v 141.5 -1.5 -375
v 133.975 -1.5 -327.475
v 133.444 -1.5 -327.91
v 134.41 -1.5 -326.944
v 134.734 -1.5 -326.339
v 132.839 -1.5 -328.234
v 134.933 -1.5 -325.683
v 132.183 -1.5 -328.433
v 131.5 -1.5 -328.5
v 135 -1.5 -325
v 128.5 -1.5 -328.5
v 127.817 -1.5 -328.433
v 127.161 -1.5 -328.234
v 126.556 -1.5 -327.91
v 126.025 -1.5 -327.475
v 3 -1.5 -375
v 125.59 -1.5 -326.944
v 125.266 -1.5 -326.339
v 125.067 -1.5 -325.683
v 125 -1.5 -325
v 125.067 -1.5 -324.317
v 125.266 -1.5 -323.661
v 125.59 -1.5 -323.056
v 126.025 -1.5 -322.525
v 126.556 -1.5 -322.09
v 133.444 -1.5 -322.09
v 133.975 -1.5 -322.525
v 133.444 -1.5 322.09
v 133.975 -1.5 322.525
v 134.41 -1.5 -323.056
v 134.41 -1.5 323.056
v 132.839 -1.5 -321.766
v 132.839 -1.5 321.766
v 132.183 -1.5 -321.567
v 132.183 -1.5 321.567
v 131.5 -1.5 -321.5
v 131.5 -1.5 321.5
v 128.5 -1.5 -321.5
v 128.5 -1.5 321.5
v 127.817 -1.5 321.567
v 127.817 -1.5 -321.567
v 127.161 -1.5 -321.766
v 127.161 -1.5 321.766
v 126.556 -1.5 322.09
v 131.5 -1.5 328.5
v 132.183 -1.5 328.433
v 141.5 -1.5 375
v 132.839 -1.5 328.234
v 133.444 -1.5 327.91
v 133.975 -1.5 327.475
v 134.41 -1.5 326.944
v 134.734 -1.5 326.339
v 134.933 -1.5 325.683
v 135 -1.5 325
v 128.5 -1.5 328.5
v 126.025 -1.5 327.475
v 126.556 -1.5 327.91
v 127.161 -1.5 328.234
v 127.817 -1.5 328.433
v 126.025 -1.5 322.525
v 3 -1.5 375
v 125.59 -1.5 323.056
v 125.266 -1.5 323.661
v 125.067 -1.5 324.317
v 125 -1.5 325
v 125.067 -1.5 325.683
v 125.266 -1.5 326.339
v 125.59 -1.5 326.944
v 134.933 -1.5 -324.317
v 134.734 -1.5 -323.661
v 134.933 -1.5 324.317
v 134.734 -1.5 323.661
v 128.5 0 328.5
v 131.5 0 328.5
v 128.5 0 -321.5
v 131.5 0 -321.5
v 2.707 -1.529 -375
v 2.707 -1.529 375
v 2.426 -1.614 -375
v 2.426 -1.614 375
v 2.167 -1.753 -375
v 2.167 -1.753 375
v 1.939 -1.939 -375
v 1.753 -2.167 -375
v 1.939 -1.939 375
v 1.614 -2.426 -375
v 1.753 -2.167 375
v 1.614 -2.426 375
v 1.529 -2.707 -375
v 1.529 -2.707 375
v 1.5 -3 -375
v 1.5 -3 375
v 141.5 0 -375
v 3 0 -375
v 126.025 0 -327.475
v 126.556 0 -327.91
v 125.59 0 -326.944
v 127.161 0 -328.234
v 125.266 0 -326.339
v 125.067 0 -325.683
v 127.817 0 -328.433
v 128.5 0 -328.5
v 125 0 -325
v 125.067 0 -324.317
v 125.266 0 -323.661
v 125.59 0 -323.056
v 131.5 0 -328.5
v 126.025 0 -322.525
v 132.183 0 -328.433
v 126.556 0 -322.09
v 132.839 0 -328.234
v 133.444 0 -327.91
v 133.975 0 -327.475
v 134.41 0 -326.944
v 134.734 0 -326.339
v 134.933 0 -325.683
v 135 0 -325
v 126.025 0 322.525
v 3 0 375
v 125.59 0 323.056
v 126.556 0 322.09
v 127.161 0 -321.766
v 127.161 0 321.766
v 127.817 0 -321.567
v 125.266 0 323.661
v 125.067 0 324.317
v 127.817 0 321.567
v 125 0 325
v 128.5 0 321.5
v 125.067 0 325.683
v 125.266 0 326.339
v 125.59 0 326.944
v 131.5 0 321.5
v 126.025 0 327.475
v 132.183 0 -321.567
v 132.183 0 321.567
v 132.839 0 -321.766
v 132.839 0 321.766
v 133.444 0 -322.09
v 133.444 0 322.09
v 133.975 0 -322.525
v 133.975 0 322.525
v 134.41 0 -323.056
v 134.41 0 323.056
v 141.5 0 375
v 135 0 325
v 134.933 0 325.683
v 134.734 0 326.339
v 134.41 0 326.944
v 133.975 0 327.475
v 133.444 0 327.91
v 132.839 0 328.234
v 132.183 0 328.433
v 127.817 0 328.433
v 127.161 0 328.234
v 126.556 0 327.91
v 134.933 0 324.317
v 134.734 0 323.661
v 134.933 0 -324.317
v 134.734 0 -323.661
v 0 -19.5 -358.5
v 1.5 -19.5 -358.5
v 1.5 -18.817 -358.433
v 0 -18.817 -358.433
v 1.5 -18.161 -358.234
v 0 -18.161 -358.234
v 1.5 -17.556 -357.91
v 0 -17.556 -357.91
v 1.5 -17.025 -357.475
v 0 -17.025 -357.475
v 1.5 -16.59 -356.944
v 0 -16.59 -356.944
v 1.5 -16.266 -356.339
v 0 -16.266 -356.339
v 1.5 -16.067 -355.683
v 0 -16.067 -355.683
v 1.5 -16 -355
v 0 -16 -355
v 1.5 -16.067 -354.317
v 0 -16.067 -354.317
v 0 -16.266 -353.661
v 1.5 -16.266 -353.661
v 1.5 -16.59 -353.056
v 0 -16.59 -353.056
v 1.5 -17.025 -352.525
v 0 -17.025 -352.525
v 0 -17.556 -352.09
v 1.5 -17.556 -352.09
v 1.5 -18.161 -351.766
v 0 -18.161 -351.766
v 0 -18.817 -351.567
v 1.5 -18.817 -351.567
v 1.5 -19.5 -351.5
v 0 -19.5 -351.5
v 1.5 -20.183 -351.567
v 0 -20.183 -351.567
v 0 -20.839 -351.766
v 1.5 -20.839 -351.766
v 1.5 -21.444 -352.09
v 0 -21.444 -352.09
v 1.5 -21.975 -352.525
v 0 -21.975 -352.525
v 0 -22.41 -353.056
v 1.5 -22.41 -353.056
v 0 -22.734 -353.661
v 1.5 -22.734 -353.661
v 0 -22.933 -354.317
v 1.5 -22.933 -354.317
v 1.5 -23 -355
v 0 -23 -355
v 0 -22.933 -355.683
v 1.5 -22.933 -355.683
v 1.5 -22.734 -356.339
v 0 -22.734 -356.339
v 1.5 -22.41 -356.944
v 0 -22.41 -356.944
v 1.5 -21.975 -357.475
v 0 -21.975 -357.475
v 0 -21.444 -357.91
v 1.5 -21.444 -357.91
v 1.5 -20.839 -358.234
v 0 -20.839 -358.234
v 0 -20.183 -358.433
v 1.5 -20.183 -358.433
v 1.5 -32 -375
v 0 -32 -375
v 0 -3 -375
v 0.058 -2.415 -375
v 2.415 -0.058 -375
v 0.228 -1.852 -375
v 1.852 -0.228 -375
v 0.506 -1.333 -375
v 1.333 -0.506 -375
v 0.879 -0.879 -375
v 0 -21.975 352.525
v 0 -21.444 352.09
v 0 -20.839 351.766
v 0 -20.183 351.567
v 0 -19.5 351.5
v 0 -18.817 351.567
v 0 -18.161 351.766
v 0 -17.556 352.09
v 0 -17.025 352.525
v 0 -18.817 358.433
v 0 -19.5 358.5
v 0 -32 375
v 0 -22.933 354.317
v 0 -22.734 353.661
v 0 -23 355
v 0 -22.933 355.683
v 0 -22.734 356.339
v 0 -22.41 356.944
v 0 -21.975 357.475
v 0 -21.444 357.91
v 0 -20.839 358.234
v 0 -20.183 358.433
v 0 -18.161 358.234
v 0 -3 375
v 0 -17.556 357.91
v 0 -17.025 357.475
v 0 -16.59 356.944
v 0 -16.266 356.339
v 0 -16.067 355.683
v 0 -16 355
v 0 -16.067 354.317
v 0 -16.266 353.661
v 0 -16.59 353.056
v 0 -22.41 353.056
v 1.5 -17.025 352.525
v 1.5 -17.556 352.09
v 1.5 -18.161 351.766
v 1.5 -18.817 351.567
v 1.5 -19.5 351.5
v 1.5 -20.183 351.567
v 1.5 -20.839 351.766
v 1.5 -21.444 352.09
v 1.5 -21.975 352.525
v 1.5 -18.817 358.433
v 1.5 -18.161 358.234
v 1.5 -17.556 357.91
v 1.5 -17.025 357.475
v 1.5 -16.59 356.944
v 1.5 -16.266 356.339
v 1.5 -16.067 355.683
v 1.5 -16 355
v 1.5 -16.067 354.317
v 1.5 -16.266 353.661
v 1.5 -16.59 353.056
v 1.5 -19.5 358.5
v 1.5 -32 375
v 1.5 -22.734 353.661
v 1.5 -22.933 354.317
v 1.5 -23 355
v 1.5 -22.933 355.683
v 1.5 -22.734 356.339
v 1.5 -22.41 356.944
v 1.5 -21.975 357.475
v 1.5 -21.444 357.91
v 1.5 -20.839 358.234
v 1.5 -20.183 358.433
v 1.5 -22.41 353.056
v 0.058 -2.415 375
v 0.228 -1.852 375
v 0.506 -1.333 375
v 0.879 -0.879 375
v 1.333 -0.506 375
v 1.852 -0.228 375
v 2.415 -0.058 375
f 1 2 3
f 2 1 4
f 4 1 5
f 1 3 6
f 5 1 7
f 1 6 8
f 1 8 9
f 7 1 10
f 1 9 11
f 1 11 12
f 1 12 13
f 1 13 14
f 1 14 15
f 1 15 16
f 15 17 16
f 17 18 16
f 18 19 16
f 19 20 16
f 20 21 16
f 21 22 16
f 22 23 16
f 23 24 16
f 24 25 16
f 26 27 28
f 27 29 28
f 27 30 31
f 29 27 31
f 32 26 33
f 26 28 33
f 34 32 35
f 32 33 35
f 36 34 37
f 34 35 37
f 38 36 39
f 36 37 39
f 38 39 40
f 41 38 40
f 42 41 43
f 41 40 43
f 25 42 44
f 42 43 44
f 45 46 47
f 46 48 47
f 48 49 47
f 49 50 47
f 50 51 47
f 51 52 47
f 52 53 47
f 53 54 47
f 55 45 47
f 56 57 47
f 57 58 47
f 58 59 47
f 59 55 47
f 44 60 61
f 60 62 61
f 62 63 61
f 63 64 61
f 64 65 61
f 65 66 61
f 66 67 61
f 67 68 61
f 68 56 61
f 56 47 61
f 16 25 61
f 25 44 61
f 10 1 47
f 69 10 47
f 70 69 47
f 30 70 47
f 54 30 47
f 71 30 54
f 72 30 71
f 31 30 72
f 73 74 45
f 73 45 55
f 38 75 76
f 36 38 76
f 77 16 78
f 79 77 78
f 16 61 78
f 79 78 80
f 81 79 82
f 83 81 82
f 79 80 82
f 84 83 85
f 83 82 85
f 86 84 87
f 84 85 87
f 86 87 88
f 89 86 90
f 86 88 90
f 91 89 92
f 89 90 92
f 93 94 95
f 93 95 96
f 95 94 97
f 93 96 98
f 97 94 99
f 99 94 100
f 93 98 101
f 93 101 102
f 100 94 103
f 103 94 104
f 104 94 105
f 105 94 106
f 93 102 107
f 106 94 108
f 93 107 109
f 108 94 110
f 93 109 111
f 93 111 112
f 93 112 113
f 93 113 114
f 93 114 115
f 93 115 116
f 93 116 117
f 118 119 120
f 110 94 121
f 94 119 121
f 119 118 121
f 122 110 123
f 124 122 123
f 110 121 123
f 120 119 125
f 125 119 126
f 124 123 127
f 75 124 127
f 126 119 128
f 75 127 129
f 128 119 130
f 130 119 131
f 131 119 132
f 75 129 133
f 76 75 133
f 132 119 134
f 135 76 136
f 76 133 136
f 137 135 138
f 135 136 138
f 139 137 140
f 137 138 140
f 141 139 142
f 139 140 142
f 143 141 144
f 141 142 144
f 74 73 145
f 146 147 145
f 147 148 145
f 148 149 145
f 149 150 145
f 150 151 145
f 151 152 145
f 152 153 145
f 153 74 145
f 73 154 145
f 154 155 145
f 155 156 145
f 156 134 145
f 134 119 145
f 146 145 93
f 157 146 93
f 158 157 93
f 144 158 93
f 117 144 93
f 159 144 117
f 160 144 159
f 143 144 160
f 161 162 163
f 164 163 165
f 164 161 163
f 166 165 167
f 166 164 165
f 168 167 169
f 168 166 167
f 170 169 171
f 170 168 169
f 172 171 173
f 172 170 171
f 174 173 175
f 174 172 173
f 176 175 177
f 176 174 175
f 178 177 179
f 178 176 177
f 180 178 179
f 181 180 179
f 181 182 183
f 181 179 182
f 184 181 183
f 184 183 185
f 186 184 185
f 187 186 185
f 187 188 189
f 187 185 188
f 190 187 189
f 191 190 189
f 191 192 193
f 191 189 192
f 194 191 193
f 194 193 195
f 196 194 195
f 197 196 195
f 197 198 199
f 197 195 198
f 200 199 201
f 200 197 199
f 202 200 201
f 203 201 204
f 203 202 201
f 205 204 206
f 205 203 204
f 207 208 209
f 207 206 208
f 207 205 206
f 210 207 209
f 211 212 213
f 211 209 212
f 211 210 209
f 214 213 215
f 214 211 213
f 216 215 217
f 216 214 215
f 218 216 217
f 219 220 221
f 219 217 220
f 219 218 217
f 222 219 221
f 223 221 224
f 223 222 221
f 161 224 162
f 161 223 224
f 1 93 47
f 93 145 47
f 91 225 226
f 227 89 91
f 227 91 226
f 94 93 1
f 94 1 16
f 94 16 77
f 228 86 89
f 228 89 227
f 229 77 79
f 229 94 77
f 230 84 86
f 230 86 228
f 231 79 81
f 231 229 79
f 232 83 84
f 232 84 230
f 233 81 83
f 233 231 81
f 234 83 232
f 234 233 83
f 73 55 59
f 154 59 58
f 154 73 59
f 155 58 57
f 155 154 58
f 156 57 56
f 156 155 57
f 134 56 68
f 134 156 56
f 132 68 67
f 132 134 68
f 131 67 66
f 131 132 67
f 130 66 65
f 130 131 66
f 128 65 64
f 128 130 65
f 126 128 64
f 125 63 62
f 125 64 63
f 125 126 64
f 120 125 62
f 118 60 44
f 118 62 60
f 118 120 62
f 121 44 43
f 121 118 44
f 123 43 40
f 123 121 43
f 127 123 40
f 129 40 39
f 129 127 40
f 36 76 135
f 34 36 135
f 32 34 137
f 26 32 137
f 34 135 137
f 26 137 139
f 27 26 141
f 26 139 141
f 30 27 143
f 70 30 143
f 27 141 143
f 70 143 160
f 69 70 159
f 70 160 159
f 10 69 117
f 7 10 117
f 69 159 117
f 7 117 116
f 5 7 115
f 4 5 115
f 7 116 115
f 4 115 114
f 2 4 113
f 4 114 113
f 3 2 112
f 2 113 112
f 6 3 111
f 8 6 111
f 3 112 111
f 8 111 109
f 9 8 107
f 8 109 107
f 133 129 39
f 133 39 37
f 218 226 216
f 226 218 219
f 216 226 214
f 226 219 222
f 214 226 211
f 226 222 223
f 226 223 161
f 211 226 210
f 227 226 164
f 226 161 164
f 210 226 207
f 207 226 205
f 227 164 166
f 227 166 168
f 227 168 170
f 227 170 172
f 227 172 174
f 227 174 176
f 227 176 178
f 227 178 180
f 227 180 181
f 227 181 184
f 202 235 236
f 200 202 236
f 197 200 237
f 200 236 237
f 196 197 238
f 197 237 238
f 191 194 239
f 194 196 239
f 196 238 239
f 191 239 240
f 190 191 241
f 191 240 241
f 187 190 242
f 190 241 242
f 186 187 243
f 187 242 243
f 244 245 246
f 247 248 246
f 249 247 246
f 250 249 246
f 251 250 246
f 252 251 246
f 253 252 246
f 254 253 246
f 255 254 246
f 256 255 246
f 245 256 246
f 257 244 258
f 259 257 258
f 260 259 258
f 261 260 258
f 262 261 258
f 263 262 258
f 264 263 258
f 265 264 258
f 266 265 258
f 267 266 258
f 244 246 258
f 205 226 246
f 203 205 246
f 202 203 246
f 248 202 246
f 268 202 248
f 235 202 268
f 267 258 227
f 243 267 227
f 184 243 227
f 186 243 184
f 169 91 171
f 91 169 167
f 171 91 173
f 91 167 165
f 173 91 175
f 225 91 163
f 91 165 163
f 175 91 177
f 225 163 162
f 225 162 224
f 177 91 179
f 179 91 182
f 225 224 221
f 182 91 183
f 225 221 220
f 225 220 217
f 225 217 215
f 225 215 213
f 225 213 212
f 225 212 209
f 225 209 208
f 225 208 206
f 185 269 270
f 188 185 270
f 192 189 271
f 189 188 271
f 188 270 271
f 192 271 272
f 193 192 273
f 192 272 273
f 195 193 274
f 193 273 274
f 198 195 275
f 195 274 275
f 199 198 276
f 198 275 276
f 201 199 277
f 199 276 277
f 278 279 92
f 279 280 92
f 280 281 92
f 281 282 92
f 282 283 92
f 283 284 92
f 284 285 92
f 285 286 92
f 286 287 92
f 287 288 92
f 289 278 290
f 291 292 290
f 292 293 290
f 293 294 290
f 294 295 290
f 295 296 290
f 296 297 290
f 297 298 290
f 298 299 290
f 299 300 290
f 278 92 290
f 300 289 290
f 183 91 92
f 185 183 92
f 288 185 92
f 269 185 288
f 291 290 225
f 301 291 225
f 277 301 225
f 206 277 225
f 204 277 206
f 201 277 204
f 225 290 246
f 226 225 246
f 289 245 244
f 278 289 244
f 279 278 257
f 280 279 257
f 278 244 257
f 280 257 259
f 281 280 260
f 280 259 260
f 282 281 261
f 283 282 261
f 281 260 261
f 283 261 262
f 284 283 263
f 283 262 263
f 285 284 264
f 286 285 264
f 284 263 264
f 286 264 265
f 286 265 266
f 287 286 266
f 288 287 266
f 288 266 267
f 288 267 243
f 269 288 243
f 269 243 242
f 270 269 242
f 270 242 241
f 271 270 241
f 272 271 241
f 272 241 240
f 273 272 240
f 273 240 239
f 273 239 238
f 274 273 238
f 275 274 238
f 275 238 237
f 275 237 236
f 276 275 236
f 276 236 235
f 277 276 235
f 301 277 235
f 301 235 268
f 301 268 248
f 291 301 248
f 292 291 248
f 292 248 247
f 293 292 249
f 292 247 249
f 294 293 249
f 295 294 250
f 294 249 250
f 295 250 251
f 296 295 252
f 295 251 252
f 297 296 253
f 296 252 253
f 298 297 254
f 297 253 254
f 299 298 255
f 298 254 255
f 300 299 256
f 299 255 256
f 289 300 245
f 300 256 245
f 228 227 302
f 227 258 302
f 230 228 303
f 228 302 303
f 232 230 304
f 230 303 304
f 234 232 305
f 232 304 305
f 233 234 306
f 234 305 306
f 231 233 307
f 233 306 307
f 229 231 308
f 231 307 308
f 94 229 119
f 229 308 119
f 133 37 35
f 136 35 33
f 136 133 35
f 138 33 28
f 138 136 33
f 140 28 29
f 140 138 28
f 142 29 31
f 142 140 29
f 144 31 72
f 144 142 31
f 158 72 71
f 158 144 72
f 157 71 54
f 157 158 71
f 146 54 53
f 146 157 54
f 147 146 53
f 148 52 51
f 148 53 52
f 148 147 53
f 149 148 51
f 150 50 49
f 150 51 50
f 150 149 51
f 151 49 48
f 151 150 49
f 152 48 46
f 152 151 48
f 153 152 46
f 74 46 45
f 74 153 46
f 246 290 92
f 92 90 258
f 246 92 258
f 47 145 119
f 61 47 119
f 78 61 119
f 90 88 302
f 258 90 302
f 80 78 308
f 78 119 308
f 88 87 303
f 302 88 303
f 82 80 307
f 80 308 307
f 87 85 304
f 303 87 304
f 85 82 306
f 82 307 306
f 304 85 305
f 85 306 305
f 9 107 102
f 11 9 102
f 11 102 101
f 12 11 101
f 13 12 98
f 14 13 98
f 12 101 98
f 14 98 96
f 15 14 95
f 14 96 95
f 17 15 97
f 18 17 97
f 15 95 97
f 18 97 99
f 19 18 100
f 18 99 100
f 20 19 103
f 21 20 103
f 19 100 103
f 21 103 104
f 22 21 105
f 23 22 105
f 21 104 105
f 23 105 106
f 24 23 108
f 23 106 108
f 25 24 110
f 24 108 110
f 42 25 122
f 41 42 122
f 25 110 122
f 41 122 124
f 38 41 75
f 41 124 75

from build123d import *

# Parameters (mm, degrees)
SM_BASE_FLANGE_1_DEPTH = 375
SKETCH_7_R             = 3.5
CUT_EXTRUDE_1_DEPTH    = 10
CUT_EXTRUDE_2_DEPTH    = 10


# Sheet-metal steps are written as plain solids
with BuildPart() as part:
    # Sketch 1 → Базовая кромка1 (new, symmetric)
    with BuildSketch(Plane.XY):
        with BuildLine():
            Line((0, -32), (0, -3))
            ThreePointArc((0, -3), (0.878679656, -0.878679656), (3, 0))
            Line((3, 0), (141.5, 0))
            Line((141.5, 0), (141.5, -1.5))
            Line((141.5, -1.5), (3, -1.5))
            ThreePointArc((3, -1.5), (1.939339828, -1.939339828), (1.5, -3))
            Line((1.5, -3), (1.5, -32))
            Line((1.5, -32), (0, -32))
        make_face()
    extrude(amount=SM_BASE_FLANGE_1_DEPTH, both=True)

    # Эскиз7 → Вырез-Вытянуть1 (cut)
    with BuildSketch(Plane.ZY):
        with Locations((355, -19.5)):
            Circle(SKETCH_7_R)
    cut_extrude_1 = extrude(amount=-CUT_EXTRUDE_1_DEPTH, mode=Mode.SUBTRACT)

    # Эскиз8 → Вырез-Вытянуть2 (cut)
    with BuildSketch(Plane(origin=(0, 0, 0), x_dir=(1, 0, 0), z_dir=(0, 1, 0))):
        with BuildLine():
            Line((131.5, -328.5), (128.5, -328.5))
            ThreePointArc((128.5, -328.5), (125, -325), (128.5, -321.5))
            Line((128.5, -321.5), (131.5, -321.5))
            ThreePointArc((131.5, -321.5), (135, -325), (131.5, -328.5))
        make_face()
    cut_extrude_2 = extrude(amount=-CUT_EXTRUDE_2_DEPTH, mode=Mode.SUBTRACT)

    # Зеркальное отражение1: Вырез-Вытянуть1, Вырез-Вытянуть2 across plane
    add(cut_extrude_1.mirror(Plane.XY), mode=Mode.SUBTRACT)
    add(cut_extrude_2.mirror(Plane.XY), mode=Mode.SUBTRACT)


solid = part.part
